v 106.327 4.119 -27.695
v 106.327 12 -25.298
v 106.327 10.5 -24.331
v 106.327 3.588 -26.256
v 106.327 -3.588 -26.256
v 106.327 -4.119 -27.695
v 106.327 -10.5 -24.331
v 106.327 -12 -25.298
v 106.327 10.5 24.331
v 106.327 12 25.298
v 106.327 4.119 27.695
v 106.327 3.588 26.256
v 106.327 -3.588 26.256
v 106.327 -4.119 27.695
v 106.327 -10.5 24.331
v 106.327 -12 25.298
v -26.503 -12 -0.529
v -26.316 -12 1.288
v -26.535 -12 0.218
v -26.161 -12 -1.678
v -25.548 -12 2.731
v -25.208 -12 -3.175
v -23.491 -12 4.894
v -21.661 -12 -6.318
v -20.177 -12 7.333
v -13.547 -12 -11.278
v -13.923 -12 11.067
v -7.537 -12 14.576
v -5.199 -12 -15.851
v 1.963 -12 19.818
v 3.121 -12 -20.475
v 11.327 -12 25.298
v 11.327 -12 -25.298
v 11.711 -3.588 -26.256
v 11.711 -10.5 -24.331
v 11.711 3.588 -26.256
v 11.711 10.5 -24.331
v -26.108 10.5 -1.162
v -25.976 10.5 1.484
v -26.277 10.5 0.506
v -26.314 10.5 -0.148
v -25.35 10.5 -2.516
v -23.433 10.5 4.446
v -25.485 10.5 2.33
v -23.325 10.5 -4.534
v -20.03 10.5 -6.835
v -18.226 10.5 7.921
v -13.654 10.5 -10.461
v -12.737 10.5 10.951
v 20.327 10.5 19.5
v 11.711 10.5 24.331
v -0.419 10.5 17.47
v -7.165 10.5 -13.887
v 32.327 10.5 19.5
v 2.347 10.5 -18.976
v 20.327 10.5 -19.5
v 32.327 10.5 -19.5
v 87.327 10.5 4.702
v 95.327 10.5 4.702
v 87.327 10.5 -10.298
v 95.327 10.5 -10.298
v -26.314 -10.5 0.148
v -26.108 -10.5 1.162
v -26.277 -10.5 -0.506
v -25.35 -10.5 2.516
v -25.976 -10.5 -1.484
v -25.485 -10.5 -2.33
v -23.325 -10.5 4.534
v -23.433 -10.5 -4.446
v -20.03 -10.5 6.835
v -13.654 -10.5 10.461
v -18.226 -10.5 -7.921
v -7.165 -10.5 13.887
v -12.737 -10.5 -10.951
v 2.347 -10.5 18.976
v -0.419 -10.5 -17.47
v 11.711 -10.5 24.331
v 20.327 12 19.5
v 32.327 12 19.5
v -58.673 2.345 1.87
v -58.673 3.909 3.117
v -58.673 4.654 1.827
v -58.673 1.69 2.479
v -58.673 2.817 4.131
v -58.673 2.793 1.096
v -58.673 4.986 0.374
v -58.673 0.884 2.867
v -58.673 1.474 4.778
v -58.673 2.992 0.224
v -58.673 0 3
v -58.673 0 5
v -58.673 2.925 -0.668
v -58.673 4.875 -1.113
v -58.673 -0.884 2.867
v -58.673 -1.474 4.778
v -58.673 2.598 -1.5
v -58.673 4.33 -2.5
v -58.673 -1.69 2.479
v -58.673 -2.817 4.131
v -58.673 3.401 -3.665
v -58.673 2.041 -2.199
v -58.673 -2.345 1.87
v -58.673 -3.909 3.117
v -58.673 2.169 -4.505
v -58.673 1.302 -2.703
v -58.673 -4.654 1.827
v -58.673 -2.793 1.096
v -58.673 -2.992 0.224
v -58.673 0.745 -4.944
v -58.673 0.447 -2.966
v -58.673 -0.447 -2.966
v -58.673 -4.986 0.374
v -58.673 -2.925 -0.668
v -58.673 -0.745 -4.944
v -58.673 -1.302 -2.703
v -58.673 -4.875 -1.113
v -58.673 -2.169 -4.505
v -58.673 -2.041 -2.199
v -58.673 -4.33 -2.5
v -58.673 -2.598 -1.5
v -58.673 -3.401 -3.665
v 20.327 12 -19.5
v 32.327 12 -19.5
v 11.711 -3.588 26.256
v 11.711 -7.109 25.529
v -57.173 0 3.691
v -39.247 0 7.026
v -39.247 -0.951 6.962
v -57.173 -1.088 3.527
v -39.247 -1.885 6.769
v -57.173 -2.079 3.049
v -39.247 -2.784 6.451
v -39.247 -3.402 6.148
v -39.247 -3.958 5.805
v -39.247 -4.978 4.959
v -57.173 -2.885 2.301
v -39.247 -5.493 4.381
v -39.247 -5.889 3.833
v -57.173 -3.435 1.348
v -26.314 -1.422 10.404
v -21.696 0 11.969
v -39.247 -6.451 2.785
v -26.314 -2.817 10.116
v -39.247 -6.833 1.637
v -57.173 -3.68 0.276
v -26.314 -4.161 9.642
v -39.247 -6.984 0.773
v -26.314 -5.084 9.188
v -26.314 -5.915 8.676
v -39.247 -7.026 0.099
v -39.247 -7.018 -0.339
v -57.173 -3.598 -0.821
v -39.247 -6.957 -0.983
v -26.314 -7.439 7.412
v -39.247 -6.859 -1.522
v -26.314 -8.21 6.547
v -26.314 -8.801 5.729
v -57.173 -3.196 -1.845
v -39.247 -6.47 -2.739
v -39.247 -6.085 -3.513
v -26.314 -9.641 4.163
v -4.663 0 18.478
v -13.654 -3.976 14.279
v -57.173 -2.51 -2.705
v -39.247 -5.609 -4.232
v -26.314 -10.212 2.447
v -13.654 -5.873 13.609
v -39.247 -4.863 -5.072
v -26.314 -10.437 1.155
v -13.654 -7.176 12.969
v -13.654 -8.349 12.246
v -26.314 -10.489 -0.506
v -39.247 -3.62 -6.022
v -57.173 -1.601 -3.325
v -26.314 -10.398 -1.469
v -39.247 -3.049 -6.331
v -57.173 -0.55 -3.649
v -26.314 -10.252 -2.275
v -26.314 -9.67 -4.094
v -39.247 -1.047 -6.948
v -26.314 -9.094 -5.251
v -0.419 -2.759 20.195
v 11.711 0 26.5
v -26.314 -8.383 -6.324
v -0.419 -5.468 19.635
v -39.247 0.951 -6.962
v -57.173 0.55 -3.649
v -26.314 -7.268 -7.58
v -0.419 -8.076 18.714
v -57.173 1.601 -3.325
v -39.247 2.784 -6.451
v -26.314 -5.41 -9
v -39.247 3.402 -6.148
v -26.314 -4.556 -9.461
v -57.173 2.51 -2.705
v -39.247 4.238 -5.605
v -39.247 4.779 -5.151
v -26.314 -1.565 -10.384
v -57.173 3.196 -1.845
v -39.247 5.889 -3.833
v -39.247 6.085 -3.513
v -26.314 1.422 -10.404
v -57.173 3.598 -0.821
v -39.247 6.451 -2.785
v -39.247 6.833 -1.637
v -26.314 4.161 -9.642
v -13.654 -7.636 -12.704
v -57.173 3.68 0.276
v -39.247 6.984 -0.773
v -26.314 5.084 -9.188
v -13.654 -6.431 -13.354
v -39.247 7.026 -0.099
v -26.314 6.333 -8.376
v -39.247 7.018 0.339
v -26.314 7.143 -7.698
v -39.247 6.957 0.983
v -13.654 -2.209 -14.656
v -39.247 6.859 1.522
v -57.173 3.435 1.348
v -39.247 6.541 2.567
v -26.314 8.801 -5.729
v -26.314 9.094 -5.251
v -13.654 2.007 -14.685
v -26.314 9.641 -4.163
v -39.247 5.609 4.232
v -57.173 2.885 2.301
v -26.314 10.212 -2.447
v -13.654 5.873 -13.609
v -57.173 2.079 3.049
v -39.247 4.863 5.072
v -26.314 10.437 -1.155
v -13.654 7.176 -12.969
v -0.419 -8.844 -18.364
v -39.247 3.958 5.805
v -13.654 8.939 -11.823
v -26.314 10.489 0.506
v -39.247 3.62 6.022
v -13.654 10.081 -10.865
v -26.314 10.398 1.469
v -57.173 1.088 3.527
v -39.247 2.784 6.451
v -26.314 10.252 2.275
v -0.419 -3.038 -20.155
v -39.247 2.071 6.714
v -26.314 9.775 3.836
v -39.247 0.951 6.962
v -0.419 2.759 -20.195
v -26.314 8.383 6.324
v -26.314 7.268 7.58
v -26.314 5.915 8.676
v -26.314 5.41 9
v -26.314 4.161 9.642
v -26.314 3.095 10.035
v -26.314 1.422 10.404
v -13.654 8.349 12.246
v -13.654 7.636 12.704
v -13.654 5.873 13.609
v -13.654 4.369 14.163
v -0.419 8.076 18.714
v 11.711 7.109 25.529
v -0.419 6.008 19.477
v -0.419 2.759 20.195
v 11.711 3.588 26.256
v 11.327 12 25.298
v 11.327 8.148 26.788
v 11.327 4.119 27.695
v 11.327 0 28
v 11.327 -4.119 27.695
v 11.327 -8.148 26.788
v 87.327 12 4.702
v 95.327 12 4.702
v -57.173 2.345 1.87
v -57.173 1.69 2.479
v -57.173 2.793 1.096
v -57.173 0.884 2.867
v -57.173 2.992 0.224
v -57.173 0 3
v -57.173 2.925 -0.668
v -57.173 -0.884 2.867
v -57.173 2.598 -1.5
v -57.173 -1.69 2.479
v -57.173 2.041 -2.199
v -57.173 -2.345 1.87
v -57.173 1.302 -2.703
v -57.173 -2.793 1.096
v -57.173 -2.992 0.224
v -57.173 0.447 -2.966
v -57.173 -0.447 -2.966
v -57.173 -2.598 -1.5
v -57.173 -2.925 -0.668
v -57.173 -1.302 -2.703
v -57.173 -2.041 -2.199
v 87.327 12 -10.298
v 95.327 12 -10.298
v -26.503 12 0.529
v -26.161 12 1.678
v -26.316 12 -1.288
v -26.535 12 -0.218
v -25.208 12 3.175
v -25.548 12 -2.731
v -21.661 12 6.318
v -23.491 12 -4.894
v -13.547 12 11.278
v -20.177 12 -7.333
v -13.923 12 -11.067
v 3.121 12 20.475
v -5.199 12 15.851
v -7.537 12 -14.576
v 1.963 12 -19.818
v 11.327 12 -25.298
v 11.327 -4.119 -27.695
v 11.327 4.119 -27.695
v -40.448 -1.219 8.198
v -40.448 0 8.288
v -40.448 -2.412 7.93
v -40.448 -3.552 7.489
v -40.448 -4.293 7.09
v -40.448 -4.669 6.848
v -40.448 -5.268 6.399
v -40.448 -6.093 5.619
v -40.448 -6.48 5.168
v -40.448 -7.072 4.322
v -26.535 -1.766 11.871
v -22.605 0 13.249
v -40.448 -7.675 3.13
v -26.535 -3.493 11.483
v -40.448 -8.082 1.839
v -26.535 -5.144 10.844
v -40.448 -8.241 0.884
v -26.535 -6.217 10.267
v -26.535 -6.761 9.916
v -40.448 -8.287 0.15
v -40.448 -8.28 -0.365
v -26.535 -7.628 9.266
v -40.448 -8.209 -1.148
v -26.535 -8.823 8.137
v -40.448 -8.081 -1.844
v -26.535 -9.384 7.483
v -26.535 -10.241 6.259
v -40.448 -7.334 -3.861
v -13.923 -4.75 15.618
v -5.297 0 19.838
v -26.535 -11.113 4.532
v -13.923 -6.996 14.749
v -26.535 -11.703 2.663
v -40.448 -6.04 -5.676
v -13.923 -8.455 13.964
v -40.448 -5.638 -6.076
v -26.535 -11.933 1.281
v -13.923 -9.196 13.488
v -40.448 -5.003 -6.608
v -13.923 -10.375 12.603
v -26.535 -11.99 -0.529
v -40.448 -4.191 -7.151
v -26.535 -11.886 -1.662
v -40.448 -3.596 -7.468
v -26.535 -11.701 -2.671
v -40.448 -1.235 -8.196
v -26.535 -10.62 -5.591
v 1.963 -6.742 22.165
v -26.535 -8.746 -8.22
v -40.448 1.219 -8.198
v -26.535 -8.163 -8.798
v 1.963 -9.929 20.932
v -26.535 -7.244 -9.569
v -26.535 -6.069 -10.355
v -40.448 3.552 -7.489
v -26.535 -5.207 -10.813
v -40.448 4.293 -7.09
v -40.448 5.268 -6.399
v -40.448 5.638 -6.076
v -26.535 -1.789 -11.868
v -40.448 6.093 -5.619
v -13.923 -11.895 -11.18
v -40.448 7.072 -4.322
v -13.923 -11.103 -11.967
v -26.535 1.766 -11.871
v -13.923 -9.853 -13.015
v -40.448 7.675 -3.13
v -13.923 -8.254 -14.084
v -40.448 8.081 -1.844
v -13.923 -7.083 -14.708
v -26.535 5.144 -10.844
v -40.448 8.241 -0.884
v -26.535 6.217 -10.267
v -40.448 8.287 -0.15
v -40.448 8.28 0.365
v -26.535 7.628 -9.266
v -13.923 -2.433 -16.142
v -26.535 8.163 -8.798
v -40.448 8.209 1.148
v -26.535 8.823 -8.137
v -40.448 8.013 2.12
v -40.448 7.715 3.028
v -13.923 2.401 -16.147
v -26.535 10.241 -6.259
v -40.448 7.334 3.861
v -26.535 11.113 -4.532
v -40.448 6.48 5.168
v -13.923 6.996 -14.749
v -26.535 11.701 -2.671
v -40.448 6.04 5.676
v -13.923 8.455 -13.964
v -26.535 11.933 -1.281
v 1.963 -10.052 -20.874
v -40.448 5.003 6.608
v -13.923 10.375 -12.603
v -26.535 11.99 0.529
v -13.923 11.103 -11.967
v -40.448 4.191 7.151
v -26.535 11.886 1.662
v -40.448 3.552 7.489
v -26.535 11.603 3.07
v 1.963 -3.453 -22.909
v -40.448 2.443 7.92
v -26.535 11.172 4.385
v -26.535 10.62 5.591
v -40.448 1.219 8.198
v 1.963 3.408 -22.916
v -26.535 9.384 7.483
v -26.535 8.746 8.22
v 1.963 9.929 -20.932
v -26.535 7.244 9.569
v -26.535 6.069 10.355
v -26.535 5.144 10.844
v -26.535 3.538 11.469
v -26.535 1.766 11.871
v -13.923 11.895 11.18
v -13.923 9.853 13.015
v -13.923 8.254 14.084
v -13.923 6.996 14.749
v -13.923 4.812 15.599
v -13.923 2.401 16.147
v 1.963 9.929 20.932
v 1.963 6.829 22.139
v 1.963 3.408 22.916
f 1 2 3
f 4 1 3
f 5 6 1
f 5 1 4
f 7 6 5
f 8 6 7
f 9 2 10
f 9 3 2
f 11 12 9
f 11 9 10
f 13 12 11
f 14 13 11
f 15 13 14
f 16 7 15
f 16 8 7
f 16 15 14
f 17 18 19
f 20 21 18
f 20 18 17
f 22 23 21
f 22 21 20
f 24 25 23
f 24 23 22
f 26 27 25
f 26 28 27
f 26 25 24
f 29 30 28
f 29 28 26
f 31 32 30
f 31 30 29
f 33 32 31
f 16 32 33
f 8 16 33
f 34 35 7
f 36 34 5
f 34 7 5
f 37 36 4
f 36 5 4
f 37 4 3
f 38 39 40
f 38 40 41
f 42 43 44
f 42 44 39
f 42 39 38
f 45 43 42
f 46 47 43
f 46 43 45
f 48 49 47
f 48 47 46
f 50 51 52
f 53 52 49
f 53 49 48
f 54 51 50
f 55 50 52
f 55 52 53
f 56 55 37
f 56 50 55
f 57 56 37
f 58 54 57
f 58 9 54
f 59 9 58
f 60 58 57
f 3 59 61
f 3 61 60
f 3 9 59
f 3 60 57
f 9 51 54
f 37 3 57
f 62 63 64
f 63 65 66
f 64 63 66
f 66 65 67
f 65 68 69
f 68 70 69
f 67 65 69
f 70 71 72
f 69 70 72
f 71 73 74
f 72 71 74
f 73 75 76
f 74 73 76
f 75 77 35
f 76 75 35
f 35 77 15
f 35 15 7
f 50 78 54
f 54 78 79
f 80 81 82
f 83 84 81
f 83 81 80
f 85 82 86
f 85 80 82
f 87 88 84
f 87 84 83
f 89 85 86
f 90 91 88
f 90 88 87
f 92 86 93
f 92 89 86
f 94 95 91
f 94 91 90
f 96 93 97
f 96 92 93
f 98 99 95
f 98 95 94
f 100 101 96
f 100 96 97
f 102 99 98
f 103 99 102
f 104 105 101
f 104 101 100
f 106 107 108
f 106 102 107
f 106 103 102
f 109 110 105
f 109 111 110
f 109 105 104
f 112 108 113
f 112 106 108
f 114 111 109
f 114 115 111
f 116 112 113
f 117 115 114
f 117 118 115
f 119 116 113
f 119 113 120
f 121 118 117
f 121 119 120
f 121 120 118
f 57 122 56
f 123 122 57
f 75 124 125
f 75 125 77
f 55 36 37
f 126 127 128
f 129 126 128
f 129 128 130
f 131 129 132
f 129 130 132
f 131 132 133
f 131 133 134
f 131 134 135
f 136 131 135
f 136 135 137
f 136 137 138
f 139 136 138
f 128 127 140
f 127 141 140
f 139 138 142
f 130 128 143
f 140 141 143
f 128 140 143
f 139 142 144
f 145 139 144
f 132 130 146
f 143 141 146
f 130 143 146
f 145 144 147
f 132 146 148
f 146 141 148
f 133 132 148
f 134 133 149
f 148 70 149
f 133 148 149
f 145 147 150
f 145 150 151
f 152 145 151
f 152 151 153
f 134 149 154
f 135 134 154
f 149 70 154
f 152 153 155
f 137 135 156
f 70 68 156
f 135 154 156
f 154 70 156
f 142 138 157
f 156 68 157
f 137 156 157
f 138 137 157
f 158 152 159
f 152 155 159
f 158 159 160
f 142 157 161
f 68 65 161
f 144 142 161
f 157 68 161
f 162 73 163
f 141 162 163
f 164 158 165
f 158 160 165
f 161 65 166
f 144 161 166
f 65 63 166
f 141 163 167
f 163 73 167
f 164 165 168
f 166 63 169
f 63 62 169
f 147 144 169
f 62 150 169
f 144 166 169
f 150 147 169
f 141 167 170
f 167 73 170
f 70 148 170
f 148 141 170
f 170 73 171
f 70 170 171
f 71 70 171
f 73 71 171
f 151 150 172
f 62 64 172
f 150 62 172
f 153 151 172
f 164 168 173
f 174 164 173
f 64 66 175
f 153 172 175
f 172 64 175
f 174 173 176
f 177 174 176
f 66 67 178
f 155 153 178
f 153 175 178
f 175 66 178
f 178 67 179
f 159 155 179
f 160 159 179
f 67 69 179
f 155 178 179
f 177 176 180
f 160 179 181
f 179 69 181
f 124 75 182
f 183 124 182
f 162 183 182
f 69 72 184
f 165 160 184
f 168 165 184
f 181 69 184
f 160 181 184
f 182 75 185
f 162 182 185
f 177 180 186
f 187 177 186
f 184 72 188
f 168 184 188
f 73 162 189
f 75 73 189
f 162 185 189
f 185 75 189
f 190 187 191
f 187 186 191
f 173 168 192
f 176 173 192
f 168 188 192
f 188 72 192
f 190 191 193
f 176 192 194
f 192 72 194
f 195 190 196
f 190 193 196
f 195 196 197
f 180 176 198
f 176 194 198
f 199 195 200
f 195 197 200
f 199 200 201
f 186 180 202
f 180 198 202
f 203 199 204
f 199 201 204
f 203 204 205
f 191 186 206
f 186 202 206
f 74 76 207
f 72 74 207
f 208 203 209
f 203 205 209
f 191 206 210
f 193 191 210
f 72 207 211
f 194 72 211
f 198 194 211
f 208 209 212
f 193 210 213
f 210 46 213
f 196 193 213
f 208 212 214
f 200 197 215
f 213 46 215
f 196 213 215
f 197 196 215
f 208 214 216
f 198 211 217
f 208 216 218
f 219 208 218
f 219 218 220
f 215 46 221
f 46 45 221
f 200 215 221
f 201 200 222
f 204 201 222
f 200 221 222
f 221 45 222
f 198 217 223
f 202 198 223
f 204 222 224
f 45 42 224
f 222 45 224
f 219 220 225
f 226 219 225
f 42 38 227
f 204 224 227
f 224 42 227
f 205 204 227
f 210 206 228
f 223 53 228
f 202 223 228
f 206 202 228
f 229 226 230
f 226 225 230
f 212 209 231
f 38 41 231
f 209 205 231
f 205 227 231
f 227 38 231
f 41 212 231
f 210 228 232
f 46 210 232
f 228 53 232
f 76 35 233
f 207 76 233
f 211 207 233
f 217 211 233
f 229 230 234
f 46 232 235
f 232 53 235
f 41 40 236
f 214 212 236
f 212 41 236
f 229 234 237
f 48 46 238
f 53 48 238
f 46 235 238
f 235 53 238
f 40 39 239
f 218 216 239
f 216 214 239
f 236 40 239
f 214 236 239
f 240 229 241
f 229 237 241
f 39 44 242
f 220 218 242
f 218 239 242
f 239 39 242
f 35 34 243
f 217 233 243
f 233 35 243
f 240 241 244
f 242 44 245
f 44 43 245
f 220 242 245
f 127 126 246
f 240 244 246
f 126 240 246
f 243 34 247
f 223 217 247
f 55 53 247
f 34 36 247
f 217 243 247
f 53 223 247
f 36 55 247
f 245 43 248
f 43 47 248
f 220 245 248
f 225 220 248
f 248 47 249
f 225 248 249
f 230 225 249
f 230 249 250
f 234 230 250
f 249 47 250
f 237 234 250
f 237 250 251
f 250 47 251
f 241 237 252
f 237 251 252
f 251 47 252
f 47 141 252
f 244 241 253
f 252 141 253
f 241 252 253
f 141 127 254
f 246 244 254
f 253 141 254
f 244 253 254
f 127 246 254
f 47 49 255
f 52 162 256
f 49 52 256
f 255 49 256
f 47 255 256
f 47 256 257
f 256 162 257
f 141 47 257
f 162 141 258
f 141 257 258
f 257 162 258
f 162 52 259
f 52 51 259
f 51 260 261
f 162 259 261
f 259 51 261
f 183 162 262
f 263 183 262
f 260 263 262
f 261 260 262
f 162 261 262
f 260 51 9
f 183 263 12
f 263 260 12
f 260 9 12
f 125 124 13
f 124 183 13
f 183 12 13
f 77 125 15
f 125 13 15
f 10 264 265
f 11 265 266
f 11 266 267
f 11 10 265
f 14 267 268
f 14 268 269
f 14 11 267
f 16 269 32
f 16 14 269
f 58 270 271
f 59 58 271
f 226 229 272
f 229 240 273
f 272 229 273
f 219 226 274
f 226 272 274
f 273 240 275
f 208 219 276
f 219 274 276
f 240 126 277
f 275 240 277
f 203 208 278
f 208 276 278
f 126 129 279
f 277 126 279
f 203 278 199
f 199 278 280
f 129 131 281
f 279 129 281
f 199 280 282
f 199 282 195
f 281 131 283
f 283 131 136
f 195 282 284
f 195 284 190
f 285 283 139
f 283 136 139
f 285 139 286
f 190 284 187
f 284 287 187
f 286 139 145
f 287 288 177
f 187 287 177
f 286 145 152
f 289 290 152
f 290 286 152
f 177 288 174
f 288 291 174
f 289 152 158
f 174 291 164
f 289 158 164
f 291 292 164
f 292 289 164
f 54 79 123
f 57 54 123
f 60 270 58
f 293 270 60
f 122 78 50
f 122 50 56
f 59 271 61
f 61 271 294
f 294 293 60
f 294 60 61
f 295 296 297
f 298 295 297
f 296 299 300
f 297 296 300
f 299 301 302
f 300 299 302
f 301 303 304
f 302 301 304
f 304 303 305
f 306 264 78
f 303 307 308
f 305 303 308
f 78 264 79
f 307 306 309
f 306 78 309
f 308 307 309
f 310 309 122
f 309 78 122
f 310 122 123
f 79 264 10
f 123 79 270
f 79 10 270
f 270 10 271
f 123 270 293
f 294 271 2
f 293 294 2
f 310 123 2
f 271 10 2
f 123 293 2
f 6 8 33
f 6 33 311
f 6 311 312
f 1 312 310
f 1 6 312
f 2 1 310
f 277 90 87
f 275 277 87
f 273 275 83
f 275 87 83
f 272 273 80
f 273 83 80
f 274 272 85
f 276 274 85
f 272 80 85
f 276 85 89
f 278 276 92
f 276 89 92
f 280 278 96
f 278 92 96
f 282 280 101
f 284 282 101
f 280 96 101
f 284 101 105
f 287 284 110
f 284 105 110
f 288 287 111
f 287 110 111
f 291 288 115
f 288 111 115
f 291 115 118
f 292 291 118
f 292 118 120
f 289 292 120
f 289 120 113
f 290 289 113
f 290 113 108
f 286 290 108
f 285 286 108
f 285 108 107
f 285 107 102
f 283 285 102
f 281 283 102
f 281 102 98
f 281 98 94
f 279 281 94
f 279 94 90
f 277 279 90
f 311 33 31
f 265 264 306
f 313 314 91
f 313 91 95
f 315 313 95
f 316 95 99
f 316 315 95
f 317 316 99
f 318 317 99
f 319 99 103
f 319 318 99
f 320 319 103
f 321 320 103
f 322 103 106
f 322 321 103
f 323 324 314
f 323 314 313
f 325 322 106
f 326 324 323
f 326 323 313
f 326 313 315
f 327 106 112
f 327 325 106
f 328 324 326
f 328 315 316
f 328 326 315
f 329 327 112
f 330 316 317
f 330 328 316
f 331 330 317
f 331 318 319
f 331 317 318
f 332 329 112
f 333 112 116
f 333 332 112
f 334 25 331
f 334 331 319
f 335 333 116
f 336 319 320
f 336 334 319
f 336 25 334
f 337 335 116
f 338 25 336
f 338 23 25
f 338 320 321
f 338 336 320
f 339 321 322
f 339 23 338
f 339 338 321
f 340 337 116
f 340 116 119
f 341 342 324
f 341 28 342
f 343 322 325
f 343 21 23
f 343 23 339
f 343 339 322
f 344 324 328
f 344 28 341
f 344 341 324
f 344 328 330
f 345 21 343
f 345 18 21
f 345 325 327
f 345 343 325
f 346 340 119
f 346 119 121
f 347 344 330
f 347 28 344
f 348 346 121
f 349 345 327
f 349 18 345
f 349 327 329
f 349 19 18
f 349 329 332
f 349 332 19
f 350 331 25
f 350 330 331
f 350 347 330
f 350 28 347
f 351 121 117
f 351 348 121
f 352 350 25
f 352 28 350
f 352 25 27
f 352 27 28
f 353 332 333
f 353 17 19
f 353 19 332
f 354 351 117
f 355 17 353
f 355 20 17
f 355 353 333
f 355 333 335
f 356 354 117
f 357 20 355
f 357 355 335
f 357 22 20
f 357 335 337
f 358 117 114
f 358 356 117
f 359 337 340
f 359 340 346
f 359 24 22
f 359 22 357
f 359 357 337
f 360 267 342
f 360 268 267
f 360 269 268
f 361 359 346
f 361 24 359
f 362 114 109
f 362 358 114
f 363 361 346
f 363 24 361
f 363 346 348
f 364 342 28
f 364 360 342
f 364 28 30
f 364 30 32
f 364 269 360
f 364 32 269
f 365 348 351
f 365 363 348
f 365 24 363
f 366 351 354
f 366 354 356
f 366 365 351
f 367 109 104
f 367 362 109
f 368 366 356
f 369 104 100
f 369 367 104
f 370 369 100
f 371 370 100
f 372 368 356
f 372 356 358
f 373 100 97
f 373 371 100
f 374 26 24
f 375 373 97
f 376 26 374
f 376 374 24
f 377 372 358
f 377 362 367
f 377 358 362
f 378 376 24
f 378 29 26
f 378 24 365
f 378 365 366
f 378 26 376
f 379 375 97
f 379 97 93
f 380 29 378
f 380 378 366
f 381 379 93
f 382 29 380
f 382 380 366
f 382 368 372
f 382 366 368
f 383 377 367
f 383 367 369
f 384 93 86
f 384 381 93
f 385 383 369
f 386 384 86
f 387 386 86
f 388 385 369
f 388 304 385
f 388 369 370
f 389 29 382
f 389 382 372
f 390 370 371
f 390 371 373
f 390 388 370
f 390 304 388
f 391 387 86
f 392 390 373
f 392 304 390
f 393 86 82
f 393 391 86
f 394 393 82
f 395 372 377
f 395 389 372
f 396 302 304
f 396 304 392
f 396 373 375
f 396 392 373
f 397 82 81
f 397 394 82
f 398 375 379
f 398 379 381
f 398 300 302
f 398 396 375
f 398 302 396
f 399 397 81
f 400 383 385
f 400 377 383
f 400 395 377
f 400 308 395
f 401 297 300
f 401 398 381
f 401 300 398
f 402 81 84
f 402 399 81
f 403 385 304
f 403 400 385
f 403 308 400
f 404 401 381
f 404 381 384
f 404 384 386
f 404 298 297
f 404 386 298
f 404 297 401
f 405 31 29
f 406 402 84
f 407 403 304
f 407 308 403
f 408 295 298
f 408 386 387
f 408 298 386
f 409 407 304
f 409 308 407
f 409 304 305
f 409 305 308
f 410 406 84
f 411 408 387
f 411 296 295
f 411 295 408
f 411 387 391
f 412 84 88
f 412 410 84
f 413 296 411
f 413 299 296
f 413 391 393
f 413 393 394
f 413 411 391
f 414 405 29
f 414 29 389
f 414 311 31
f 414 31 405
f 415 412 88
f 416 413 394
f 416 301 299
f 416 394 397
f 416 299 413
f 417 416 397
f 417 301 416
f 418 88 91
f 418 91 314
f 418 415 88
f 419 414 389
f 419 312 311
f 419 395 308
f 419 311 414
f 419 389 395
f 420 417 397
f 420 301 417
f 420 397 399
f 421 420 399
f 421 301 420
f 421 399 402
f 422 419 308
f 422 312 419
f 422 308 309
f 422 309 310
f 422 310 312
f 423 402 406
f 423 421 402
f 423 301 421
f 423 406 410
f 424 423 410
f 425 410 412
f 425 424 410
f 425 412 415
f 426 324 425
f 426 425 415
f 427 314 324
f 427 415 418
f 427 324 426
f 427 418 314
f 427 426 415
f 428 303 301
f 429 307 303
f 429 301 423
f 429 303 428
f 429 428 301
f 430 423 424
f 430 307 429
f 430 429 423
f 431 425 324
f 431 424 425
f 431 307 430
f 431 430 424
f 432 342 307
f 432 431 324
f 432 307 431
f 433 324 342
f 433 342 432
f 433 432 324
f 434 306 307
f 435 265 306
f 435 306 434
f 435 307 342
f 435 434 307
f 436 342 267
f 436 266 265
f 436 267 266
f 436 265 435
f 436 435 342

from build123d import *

# Parameters (mm, degrees)
CORTE_EXTRUS_O2_DEPTH = 170.685002284
CASCA2_T              = -1.5
ESBO_O9_R             = 3
CORTE_EXTRUS_O3_DEPTH = 168.788557539
ESBO_O10_W            = 12
ESBO_O10_H            = 39
CORTE_EXTRUS_O4_DEPTH = 1.5
ESBO_O11_W            = 8
ESBO_O11_H            = 15
CORTE_EXTRUS_O5_DEPTH = 1.5


with BuildPart() as part:
    # Esboço7 → Revolução1 (revolve)
    with BuildSketch(Plane.XY, mode=Mode.PRIVATE) as revolu_o1_sk:
        with BuildLine():
            Line((-58.672933336, 0), (-58.672933336, 5))
            ThreePointArc((-58.672933336, 5), (-22.604617679, 13.248604524), (11.327066664, 28))
            Line((11.327066664, 28), (106.327066664, 28))
            Line((106.327066664, 28), (106.327066664, 0))
            Line((106.327066664, 0), (-58.672933336, 0))
        make_face()
    revolve(revolu_o1_sk.sketch.rotate(Axis((-70.454996685, 0, 0), (1, 0, 0)), 90), axis=Axis((-70.454996685, 0, 0), (1, 0, 0)))

    # Esboço8 → Corte-extrusão2 (cut, through all)
    with BuildSketch(Plane(origin=(106.327066664, 0, 0), x_dir=(0, 0, -1), z_dir=(1, 0, 0))):
        with BuildLine():
            Line((-25.298221281, 12), (25.298221281, 12))
            ThreePointArc((25.298221281, 12), (0, 28), (-25.298221281, 12))
        make_face()
        with BuildLine():
            Line((-25.298221281, -12), (25.298221281, -12))
            ThreePointArc((25.298221281, -12), (0, -28), (-25.298221281, -12))
        make_face()
    extrude(amount=-CORTE_EXTRUS_O2_DEPTH, mode=Mode.SUBTRACT)

    # Casca2
    casca2_openings = [part.faces().sort_by_distance(p)[0] for p in [
        (106.327066664, 0, 0),
    ]]
    offset(amount=CASCA2_T, openings=casca2_openings)

    # Esboço9 → Corte-extrusão3 (cut, through all)
    with BuildSketch(Plane.ZY.offset(58.672933336)):
        Circle(ESBO_O9_R)
    extrude(amount=-CORTE_EXTRUS_O3_DEPTH, mode=Mode.SUBTRACT)

    # Esboço10 → Corte-extrusão4 (cut)
    with BuildSketch(Plane(origin=(0, 12, 0), x_dir=(1, 0, 0), z_dir=(0, 1, 0))):
        with Locations((26.327066664, 0)):
            Rectangle(ESBO_O10_W, ESBO_O10_H)
    extrude(amount=-CORTE_EXTRUS_O4_DEPTH, mode=Mode.SUBTRACT)

    # Esboço11 → Corte-extrusão5 (cut)
    with BuildSketch(Plane(origin=(0, 12, 0), x_dir=(1, 0, 0), z_dir=(0, 1, 0))):
        with Locations((91.327066664, 2.798221281)):
            Rectangle(ESBO_O11_W, ESBO_O11_H)
    extrude(amount=-CORTE_EXTRUS_O5_DEPTH, mode=Mode.SUBTRACT)


solid = part.part
